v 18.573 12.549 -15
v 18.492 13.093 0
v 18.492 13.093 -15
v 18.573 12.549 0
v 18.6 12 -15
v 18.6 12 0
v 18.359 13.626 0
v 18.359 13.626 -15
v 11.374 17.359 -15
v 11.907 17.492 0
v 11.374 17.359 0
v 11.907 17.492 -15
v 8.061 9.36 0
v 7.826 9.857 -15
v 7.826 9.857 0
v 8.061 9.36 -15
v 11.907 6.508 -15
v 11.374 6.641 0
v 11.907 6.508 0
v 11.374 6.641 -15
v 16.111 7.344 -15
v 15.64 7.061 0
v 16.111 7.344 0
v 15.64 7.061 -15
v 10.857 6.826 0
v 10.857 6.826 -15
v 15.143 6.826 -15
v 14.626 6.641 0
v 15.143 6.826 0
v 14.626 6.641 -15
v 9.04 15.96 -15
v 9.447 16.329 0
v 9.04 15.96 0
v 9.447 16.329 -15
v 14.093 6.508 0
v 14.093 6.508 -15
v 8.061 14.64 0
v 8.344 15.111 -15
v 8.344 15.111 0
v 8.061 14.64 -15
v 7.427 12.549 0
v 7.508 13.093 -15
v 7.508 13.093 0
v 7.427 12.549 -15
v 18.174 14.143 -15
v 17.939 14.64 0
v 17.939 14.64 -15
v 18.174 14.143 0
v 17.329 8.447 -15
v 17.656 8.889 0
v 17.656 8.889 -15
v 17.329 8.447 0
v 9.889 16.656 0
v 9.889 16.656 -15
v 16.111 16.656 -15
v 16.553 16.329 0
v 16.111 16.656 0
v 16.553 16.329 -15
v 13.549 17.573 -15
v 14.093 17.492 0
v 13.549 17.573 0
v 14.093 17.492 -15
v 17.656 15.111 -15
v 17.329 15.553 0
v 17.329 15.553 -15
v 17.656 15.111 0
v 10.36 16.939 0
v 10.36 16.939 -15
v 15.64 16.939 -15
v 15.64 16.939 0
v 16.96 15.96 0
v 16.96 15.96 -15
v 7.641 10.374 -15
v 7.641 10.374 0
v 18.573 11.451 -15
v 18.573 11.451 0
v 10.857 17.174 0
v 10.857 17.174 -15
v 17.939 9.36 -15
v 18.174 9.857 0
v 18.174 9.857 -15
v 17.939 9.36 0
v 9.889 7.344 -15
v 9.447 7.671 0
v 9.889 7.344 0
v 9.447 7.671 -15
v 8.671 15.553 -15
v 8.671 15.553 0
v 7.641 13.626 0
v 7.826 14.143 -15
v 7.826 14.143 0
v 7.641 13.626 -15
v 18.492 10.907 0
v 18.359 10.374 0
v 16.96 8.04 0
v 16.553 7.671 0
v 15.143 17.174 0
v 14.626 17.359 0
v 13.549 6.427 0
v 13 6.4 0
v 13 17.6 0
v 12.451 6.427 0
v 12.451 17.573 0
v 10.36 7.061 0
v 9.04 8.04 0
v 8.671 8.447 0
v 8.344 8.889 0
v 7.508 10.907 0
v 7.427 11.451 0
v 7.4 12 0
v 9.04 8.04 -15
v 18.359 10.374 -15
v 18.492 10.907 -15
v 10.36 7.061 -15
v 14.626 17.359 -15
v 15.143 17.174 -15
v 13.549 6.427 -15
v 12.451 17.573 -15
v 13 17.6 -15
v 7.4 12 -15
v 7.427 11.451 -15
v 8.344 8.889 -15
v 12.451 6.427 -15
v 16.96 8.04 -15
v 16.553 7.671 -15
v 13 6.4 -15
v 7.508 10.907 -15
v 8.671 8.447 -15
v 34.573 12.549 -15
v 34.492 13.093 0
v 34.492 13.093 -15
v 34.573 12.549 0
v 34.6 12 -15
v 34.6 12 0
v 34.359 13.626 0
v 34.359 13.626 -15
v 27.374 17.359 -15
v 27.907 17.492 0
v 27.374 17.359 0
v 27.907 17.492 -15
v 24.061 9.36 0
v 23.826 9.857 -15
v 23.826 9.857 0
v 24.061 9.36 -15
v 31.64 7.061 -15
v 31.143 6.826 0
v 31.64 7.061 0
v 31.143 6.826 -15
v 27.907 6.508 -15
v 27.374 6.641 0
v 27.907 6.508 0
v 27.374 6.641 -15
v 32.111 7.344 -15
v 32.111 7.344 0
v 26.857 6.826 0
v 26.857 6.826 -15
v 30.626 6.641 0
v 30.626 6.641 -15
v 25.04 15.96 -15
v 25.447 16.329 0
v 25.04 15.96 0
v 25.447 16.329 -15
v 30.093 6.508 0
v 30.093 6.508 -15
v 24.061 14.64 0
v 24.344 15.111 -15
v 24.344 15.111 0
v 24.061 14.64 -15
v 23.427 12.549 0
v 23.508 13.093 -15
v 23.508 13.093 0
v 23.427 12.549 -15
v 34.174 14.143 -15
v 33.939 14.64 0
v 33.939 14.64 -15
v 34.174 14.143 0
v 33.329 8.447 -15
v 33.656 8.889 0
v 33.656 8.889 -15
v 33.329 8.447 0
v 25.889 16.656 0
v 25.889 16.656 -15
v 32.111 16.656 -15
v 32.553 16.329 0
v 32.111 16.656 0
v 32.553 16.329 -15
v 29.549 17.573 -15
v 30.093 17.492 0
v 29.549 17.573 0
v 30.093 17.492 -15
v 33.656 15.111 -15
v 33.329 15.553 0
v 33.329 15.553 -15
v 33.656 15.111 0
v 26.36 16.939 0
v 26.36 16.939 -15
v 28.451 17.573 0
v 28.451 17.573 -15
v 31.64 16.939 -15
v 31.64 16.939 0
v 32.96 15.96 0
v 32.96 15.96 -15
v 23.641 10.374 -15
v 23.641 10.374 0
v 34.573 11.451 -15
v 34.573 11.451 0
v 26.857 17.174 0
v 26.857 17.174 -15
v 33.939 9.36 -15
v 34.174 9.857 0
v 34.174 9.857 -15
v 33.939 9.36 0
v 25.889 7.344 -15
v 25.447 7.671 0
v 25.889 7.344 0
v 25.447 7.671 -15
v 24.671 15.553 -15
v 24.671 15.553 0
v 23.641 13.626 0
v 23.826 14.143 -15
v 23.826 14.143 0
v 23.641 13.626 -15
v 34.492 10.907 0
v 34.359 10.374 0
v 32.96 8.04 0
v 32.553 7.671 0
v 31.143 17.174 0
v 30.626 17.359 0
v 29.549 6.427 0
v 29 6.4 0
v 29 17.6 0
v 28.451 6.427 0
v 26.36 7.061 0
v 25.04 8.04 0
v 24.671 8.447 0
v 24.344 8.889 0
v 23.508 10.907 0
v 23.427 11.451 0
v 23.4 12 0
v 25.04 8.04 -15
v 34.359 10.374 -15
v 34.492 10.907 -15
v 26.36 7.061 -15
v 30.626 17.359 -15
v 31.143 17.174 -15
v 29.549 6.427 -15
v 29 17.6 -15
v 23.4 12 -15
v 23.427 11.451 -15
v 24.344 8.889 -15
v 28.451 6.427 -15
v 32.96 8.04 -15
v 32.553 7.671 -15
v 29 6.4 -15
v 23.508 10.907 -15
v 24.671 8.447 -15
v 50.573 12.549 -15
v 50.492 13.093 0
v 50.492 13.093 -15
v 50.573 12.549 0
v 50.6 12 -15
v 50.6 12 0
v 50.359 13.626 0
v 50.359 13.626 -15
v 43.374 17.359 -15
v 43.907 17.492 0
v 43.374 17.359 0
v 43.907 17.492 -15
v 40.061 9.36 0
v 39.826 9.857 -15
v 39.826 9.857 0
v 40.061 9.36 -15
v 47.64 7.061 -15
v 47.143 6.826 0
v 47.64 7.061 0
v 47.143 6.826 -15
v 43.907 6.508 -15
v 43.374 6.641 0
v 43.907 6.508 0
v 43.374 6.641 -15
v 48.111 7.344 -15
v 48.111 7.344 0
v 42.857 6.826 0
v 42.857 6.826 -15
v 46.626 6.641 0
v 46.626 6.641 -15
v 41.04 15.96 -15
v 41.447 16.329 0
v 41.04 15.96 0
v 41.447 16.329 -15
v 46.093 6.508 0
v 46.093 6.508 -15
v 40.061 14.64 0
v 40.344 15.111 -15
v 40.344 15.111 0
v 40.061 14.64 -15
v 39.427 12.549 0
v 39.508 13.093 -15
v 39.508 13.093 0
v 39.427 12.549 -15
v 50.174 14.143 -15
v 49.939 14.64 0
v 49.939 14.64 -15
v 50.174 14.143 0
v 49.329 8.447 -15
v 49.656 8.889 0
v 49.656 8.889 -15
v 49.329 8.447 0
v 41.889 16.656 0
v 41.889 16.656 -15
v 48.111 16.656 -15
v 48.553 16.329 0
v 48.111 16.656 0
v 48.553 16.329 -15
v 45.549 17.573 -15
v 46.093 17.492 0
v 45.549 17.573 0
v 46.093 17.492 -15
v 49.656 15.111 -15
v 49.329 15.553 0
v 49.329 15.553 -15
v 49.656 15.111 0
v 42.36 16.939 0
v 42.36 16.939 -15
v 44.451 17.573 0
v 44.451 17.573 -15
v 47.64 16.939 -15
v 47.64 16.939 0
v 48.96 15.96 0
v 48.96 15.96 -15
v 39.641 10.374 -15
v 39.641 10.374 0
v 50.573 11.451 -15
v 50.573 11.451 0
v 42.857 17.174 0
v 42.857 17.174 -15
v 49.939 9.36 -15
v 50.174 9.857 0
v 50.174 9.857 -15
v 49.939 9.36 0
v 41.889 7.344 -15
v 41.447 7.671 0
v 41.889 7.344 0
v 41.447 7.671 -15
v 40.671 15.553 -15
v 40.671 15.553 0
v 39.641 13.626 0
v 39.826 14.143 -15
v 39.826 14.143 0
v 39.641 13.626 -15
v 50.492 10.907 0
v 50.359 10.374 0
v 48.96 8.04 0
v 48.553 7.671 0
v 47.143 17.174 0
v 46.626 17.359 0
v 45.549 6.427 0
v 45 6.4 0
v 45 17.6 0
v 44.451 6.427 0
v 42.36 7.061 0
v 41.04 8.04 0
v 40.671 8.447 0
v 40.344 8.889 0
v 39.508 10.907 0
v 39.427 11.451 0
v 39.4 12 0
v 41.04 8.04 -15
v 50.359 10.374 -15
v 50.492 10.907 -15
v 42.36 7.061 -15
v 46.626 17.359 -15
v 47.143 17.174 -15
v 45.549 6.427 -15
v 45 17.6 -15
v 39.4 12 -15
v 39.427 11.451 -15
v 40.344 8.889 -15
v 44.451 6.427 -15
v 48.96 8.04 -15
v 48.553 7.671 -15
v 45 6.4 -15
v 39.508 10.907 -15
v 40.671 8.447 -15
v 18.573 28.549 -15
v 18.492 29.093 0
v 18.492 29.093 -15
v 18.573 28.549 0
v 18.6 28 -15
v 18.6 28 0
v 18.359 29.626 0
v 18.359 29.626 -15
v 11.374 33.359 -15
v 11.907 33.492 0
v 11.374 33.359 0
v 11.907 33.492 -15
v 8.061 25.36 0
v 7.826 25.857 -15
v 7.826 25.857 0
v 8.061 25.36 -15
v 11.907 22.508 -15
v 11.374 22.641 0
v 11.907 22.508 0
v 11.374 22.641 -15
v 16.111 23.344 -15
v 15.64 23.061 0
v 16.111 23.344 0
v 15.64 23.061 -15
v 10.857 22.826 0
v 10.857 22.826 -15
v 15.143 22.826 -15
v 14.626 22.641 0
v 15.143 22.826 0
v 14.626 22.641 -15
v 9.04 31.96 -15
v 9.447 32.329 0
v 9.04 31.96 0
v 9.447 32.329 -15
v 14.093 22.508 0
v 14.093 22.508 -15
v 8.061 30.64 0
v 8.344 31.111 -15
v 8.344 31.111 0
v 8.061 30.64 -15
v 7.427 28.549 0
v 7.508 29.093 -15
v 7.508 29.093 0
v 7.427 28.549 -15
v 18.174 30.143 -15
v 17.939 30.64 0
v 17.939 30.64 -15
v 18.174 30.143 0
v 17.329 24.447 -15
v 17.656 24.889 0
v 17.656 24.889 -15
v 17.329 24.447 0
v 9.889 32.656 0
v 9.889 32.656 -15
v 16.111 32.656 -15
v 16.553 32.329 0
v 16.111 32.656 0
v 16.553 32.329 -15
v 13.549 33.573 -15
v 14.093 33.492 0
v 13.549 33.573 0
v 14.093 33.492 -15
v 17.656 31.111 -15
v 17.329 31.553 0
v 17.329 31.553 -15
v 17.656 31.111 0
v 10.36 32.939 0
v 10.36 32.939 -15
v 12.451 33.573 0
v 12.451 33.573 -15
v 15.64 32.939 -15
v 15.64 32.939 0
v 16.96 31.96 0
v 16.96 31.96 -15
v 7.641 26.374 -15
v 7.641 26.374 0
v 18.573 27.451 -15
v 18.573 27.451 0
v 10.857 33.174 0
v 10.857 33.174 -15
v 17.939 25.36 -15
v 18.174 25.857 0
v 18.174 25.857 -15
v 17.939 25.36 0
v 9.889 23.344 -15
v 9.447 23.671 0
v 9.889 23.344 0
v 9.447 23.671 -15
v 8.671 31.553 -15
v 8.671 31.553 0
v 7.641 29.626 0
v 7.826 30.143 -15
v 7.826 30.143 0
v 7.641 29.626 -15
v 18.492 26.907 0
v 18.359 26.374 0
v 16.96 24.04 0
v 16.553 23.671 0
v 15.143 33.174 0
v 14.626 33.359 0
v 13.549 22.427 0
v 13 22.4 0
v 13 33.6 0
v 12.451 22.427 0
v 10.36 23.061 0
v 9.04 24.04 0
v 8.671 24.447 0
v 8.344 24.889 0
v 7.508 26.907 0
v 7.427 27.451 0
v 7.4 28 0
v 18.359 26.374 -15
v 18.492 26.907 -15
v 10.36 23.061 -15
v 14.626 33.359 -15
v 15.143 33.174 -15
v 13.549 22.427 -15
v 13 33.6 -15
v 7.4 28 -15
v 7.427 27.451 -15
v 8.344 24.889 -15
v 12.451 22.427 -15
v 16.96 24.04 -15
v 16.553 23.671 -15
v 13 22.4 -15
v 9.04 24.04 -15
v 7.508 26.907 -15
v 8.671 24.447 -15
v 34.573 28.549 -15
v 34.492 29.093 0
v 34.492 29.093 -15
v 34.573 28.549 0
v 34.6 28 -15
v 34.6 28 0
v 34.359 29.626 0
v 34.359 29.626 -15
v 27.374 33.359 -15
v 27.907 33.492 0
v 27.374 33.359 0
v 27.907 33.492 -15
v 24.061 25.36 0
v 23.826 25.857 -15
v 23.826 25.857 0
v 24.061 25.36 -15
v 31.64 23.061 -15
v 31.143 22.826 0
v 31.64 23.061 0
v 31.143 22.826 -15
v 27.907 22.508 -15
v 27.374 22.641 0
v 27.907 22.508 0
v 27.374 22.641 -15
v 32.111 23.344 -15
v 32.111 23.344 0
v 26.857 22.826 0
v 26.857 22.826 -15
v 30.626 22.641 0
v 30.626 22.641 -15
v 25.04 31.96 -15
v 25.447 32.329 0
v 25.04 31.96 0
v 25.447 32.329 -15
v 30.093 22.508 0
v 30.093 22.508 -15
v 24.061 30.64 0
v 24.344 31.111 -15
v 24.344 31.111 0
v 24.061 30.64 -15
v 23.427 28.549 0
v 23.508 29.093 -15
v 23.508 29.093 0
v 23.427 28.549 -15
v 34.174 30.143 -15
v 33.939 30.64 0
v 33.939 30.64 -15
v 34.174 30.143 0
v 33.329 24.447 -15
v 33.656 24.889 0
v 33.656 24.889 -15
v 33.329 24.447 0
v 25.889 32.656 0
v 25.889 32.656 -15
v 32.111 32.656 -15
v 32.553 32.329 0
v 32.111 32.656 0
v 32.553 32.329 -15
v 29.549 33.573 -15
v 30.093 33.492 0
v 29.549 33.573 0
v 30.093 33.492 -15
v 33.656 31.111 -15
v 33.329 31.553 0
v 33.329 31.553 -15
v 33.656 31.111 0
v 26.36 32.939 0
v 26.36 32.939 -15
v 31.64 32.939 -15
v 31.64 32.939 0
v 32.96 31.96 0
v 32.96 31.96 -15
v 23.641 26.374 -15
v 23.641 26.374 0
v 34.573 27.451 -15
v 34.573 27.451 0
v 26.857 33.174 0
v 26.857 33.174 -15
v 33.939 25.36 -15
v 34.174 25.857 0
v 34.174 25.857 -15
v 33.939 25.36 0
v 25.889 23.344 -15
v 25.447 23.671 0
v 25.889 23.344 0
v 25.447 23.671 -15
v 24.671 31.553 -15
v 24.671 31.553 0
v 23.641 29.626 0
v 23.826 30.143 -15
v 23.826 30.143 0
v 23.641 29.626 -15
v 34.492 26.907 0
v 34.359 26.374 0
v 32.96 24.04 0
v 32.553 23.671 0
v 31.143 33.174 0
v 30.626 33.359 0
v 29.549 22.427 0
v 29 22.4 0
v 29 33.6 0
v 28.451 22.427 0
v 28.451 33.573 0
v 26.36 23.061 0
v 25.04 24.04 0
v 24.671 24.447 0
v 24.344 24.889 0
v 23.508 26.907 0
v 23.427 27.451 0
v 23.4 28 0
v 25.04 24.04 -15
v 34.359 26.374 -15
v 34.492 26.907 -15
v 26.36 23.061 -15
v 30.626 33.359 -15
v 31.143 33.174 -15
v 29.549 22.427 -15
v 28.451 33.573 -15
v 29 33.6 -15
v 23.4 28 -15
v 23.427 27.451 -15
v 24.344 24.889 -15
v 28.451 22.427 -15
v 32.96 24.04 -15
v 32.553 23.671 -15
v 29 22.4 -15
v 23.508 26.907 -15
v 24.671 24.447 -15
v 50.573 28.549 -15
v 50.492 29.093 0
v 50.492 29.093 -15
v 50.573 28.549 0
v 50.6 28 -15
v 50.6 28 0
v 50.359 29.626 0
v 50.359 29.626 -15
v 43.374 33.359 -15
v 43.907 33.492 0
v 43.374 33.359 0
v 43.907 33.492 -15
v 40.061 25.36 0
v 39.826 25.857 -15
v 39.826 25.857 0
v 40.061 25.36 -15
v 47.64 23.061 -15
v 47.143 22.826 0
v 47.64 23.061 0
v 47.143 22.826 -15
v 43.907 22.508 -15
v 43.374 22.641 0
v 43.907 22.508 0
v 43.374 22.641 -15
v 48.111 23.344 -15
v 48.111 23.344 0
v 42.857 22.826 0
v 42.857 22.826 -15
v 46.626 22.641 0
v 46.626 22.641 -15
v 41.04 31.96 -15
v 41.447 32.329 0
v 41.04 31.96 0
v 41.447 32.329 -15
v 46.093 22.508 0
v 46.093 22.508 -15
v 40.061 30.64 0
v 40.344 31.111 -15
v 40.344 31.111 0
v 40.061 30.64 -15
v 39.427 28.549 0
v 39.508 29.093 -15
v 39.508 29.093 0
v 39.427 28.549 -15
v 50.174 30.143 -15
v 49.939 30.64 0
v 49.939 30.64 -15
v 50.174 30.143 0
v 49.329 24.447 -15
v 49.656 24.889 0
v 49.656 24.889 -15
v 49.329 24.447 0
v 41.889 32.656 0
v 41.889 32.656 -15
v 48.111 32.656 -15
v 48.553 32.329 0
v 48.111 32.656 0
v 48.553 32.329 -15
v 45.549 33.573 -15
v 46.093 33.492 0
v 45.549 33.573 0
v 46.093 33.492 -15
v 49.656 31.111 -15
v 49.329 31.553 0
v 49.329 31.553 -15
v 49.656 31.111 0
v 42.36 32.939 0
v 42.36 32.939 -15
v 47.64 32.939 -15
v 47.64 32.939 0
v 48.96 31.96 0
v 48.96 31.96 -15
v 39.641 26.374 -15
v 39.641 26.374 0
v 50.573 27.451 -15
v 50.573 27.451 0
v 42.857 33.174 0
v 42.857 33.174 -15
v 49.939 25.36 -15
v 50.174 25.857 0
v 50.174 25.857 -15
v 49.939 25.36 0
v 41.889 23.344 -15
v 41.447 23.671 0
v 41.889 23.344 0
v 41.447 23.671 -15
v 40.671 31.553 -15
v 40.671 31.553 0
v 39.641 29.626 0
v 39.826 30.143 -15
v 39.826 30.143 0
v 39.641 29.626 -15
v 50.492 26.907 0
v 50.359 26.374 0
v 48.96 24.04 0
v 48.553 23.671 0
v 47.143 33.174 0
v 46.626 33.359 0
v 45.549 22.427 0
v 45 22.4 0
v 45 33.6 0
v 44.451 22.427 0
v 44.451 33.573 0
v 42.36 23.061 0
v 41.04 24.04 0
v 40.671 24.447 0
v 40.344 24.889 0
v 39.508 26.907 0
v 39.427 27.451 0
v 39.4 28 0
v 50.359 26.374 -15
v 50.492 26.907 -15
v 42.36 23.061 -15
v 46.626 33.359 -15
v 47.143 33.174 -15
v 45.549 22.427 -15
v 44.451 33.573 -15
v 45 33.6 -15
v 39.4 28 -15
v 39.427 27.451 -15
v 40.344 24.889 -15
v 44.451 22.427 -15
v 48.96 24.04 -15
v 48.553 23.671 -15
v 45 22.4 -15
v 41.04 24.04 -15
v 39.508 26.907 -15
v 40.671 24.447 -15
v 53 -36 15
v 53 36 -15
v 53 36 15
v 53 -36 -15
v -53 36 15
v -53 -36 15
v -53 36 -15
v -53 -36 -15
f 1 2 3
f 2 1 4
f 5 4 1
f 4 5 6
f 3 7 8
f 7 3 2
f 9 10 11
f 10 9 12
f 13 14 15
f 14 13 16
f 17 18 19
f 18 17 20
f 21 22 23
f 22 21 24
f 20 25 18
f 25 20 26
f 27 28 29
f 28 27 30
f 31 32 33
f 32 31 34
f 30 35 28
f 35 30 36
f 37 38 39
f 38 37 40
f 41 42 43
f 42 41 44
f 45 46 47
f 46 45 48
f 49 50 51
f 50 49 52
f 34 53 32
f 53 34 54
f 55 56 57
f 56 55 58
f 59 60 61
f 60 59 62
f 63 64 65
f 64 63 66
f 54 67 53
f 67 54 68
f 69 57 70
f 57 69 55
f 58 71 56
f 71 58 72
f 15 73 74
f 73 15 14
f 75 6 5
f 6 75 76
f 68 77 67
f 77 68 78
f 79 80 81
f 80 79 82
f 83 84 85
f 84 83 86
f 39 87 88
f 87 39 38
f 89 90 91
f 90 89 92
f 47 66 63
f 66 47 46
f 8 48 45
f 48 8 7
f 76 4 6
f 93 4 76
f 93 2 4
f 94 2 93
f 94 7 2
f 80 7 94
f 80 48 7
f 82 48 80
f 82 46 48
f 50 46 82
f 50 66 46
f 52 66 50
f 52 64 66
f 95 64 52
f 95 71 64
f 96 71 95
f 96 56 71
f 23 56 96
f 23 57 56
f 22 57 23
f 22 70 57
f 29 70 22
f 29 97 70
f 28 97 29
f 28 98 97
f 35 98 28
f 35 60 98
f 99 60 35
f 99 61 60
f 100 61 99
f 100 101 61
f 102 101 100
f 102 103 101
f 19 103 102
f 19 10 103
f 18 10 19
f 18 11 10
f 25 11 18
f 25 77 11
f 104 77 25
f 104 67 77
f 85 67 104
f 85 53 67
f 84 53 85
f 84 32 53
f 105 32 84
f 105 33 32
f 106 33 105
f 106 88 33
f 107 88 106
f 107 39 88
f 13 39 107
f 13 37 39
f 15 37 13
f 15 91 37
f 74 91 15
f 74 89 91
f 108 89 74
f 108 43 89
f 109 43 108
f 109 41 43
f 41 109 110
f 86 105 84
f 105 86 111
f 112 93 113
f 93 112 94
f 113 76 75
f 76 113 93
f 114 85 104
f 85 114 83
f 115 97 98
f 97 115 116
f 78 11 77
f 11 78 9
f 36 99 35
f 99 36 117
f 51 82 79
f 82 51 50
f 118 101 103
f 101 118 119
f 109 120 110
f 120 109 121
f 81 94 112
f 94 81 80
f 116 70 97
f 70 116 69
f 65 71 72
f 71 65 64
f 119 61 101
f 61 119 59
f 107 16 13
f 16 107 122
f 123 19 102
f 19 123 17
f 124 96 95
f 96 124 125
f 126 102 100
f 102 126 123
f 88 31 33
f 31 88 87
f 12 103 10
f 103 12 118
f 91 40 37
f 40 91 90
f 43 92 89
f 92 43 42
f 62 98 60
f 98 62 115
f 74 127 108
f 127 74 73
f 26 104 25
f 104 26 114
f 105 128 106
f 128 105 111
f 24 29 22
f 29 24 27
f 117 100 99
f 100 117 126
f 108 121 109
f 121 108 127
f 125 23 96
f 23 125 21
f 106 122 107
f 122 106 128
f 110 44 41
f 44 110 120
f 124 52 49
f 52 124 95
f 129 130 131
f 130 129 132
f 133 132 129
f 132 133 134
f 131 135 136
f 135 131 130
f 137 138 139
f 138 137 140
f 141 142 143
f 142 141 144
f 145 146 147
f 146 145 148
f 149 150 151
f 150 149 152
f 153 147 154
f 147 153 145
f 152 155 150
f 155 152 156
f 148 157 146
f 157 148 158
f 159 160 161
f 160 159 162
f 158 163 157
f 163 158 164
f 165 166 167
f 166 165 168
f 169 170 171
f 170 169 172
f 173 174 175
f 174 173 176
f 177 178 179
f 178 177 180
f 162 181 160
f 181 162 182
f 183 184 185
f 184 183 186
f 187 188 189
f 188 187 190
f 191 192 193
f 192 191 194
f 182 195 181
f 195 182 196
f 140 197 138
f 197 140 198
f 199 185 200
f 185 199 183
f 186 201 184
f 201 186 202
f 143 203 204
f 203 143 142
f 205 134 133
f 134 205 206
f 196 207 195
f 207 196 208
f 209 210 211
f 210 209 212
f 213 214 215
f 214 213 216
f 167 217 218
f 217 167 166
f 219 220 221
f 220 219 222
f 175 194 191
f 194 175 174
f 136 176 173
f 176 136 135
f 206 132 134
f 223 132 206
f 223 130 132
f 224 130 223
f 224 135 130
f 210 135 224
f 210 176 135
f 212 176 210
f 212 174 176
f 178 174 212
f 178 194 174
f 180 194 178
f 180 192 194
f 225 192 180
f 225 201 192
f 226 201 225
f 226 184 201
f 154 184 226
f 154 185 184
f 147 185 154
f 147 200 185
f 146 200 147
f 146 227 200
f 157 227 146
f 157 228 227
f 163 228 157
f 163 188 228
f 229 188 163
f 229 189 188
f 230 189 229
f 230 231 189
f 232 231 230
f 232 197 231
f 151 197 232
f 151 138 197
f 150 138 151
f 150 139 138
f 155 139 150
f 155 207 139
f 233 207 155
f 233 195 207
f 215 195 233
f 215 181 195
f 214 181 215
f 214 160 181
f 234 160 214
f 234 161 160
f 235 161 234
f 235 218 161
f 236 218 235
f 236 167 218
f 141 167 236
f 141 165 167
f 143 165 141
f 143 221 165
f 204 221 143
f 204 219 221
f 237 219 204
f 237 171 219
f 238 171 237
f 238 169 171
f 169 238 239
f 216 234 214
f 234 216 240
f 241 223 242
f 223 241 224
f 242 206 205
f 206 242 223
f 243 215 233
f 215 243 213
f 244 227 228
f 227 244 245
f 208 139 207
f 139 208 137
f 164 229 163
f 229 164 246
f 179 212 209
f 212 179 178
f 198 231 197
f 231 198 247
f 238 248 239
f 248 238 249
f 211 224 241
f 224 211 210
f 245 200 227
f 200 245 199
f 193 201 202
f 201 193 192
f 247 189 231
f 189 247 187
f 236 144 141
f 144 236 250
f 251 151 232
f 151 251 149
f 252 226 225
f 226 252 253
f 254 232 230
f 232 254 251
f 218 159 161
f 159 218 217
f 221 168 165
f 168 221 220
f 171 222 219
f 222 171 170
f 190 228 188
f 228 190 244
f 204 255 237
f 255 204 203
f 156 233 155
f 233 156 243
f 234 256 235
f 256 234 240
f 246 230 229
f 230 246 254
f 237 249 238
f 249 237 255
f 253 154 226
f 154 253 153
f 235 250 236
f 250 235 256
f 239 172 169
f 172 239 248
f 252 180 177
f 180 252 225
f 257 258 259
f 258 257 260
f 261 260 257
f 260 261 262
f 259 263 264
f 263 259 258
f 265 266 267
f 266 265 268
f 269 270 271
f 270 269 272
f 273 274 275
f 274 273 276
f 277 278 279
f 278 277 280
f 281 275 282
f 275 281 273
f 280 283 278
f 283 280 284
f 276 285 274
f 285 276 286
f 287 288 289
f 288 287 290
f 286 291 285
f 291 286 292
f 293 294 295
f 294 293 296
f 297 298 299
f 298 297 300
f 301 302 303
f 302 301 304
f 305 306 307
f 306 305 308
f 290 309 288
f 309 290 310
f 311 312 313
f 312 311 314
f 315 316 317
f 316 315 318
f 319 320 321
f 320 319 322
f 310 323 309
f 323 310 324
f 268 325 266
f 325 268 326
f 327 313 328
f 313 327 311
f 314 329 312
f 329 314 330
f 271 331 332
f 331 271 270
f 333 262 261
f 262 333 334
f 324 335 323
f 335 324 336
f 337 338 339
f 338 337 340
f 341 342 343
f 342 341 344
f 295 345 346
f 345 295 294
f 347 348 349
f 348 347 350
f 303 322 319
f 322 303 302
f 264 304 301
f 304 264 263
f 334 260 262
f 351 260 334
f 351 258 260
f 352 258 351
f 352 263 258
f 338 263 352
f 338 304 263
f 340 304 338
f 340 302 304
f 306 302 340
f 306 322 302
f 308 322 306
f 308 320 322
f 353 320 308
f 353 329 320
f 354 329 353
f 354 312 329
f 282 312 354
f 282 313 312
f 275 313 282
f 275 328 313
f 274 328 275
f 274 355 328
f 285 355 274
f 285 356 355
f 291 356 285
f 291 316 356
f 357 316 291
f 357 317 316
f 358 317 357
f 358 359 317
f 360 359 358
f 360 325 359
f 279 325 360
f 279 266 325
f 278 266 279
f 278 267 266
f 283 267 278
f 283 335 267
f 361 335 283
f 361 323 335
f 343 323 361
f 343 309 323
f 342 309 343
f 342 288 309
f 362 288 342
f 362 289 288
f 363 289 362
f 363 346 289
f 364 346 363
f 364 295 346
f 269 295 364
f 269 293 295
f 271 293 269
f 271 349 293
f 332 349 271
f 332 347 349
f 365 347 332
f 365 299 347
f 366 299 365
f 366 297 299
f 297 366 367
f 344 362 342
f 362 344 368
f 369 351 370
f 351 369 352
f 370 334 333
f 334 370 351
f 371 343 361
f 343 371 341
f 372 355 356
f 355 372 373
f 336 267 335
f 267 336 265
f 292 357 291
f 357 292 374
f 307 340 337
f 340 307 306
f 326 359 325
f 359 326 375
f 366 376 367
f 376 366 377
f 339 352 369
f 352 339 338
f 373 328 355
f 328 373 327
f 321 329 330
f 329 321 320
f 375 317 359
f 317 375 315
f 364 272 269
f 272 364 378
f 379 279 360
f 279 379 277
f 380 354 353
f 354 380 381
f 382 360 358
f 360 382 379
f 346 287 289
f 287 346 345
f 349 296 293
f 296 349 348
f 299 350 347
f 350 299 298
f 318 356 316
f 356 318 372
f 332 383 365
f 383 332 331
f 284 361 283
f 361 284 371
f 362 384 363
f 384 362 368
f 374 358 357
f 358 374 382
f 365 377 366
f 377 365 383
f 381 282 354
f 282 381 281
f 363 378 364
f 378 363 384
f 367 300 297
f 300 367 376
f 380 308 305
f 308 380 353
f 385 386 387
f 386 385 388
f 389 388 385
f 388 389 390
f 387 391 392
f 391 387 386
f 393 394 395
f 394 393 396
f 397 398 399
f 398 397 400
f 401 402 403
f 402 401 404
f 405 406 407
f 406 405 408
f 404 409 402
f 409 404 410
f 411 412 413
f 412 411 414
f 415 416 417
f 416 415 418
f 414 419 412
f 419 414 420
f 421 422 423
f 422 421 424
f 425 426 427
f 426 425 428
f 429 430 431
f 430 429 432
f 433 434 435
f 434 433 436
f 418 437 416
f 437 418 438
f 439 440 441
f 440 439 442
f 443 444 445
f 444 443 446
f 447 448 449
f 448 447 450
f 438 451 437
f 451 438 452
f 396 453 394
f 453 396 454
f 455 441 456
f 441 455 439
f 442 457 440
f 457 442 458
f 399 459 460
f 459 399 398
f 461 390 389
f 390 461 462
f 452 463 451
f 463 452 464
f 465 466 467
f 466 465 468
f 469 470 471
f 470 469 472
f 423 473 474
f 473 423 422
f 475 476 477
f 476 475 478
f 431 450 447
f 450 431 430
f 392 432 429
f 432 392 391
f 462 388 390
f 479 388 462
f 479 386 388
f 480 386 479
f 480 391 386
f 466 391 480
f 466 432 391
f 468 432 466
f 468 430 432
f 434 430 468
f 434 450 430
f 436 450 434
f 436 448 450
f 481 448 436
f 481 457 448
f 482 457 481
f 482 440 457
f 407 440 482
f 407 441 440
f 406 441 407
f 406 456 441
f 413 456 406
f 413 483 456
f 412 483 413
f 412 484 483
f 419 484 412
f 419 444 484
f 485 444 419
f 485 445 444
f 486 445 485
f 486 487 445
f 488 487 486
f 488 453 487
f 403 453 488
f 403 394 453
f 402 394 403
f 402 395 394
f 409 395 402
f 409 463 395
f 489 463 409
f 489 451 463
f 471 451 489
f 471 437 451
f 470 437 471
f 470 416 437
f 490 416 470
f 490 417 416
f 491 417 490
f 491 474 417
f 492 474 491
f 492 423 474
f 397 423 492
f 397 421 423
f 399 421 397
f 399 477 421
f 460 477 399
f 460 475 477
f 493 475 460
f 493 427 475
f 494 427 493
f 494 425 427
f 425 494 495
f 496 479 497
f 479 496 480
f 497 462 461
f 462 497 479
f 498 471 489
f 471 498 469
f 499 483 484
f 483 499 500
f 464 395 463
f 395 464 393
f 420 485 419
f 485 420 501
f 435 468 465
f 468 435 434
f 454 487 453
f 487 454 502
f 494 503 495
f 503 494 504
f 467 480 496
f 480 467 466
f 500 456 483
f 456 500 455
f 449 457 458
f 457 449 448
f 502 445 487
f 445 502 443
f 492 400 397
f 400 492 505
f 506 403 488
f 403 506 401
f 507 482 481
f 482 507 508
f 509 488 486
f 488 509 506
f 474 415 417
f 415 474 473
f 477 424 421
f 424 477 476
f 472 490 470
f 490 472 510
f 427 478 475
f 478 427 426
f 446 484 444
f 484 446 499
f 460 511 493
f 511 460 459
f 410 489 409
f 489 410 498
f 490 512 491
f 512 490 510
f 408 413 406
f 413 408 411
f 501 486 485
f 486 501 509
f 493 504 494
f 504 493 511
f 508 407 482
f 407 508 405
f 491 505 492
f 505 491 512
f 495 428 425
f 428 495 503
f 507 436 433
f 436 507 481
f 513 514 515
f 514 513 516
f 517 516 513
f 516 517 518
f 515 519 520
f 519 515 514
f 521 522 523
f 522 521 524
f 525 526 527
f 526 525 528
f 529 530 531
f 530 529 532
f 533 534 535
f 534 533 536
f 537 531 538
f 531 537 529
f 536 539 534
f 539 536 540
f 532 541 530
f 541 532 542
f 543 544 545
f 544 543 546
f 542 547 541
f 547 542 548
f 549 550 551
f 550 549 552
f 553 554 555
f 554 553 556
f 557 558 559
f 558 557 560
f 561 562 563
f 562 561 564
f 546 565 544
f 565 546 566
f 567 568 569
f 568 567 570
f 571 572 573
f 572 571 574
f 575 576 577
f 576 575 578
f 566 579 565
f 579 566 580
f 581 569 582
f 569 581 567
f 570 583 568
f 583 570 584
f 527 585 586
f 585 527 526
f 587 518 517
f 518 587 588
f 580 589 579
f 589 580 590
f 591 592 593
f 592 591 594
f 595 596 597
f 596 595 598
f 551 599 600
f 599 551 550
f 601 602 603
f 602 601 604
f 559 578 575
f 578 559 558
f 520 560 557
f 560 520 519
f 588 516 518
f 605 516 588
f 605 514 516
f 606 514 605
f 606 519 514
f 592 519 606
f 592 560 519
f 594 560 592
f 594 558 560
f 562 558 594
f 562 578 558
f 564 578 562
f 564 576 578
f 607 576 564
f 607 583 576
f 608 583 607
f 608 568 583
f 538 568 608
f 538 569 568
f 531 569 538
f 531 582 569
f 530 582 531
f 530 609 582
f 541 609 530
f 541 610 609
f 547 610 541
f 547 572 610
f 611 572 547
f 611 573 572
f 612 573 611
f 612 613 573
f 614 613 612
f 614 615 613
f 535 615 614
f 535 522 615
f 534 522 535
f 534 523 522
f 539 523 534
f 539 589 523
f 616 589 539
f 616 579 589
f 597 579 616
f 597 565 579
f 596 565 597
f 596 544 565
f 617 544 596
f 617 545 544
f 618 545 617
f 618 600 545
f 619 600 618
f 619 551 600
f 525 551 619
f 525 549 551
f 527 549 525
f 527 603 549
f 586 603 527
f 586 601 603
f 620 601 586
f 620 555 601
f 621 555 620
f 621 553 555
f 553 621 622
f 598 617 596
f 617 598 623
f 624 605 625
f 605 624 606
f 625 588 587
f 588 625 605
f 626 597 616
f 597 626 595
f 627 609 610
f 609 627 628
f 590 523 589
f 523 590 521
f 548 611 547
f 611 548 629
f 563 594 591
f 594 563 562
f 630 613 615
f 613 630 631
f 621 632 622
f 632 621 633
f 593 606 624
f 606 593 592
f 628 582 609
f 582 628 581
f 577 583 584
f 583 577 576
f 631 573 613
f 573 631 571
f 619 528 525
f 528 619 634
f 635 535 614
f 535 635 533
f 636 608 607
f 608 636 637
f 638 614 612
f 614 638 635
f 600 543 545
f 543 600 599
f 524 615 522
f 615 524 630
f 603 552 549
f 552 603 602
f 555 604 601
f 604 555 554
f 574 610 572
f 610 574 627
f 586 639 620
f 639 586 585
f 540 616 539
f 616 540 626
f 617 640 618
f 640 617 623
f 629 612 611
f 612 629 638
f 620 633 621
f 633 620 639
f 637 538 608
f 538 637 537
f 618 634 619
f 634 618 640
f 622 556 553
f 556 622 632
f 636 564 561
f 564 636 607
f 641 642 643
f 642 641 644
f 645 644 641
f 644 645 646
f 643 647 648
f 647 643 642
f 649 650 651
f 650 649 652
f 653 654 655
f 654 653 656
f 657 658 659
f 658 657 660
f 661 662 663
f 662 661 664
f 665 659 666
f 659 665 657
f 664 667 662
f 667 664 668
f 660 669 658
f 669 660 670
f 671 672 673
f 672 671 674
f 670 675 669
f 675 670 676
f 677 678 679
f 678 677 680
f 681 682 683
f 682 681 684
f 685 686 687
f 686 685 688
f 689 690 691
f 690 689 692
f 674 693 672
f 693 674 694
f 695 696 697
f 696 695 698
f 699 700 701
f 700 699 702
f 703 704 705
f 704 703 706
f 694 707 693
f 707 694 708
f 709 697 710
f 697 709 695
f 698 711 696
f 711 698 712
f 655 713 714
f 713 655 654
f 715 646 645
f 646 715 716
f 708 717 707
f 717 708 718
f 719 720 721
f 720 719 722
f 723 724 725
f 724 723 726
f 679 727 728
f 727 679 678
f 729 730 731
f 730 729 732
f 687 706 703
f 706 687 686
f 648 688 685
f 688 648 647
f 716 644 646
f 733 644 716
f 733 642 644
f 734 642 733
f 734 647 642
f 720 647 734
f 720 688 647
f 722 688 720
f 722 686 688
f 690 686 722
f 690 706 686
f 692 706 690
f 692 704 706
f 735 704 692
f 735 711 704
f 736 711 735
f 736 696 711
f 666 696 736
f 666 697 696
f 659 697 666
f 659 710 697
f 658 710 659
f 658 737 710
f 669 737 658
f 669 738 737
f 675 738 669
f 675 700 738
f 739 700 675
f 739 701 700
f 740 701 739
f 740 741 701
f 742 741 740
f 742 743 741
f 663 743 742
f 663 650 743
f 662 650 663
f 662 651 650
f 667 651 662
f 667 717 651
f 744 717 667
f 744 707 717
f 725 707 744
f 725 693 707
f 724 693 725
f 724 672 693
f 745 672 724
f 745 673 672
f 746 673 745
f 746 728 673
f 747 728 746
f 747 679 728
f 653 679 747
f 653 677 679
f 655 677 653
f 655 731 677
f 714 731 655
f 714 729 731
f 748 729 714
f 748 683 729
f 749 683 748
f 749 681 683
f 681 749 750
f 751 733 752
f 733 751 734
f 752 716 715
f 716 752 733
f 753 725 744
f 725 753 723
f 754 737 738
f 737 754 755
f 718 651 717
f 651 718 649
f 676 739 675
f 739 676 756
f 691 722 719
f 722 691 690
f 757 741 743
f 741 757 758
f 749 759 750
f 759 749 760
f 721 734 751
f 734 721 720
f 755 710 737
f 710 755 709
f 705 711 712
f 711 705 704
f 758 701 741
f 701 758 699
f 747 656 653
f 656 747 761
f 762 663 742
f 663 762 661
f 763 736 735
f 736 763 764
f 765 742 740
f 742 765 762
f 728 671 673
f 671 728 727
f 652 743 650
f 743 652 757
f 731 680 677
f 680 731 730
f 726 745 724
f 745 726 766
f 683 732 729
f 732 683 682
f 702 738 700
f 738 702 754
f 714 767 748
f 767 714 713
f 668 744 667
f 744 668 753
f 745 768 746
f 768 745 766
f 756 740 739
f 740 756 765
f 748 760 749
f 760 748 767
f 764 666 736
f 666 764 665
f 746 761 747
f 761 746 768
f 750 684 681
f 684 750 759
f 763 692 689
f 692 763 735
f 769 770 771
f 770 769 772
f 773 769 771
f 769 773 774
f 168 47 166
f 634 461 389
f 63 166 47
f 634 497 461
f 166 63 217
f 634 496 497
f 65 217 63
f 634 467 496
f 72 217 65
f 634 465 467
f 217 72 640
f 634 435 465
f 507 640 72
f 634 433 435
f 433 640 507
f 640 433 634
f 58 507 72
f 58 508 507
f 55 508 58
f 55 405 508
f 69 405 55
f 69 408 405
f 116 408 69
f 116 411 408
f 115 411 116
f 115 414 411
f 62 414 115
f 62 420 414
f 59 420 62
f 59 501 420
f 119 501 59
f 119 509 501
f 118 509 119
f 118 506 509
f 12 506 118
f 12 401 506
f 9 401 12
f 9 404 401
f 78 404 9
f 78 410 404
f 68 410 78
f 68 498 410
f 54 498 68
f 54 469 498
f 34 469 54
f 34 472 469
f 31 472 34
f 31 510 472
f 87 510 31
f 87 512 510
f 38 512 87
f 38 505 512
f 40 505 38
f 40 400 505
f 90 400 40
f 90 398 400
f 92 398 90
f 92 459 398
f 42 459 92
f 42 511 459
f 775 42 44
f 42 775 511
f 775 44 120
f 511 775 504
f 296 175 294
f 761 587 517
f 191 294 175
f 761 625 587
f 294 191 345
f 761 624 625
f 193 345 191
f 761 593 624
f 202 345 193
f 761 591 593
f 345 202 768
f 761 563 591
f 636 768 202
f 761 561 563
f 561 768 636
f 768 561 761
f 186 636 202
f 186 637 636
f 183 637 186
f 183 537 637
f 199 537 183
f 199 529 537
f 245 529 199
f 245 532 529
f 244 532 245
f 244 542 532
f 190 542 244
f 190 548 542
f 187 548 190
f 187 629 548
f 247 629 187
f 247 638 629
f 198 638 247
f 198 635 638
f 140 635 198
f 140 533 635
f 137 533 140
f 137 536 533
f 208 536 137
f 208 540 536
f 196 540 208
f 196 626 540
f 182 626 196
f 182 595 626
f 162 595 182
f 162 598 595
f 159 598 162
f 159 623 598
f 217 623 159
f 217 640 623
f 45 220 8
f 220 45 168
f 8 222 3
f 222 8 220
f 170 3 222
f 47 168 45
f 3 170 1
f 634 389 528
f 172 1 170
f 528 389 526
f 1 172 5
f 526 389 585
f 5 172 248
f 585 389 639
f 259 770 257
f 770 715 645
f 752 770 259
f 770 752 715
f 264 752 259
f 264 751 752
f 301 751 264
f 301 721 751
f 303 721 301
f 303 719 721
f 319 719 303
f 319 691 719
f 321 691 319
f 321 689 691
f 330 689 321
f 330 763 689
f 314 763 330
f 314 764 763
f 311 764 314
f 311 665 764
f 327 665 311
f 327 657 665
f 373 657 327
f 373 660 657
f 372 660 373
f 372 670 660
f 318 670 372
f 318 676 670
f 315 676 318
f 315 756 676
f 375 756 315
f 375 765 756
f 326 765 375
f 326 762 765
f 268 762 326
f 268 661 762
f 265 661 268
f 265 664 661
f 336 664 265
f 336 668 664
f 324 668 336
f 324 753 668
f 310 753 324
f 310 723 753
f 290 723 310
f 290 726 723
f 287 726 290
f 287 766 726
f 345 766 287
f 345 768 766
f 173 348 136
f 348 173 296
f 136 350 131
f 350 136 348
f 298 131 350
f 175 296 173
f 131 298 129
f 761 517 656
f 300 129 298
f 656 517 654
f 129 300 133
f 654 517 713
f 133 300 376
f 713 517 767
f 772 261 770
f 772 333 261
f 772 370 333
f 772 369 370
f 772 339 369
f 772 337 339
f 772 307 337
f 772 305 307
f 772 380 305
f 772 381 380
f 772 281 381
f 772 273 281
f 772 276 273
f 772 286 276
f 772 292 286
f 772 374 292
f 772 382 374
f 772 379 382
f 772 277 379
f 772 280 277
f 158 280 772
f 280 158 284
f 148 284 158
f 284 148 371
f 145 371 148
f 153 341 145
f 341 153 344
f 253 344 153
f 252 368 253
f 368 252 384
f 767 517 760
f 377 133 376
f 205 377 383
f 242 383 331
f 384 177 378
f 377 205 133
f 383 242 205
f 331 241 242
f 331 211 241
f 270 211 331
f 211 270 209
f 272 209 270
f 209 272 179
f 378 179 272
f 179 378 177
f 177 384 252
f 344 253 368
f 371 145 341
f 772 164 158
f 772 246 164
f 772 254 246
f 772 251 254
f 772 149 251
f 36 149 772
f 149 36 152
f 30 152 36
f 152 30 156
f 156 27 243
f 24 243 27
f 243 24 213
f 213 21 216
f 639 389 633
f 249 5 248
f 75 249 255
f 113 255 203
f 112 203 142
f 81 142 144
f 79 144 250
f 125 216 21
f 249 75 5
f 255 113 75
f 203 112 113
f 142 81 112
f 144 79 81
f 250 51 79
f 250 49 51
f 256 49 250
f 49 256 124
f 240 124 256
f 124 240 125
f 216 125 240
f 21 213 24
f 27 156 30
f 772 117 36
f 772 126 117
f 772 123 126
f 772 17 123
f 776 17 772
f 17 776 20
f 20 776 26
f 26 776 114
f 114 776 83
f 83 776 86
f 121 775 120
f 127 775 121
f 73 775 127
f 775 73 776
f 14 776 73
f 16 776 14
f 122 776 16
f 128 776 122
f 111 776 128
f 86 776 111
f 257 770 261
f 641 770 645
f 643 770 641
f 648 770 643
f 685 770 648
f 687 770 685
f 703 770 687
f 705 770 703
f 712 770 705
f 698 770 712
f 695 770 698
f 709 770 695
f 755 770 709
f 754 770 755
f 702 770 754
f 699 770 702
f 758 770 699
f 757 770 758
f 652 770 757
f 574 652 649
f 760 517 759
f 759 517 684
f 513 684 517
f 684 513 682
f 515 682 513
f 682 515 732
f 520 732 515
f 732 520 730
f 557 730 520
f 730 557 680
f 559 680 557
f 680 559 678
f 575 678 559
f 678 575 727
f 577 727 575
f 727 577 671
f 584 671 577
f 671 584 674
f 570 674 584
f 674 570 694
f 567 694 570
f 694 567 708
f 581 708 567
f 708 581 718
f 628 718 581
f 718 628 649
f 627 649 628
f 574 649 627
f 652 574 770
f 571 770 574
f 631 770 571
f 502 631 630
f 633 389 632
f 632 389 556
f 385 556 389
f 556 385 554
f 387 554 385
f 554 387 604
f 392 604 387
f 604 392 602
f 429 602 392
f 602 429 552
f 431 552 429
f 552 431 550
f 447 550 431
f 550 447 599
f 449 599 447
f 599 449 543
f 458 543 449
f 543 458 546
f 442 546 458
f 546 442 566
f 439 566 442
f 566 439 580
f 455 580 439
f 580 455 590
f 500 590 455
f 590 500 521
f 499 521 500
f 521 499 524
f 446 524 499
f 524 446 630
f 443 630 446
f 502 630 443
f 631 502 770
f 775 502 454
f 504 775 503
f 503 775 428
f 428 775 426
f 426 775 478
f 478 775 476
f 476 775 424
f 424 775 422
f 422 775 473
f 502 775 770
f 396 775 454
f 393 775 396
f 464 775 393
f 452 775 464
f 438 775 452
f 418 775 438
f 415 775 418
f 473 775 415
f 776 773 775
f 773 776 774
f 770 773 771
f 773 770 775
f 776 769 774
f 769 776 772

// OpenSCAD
// Bench Rack for 1.5 mL Microcentrifuge Tubes
// Designed for FDM printing. Rests on XY plane at Z=0.

// --- Dimensions ---
// Block dimensions
$block_length = 106; // X
$block_width = 72;   // Y
$block_height = 30;  // Z

// Grid configuration
$grid_rows = 4;      // Rows along Y
$grid_cols = 6;      // Columns along X
$grid_spacing_x = 16; // Centre-to-centre X
$grid_spacing_y = 16; // Centre-to-centre Y

// Hole configuration
$hole_diameter = 11.2;
$hole_depth = 25;    // Depth of the hole (open top, closed bottom)
$floor_thickness = 5; // Solid floor at bottom (30 - 25 = 5)

// --- Settings ---
$fn = 64; // Smooth curves for holes

// --- Calculations ---
// Calculate offsets to center the grid on the block
// Total grid width = (cols - 1) * spacing
// Offset from edge = (Block Width - Total Grid Width) / 2
$offset_x = ($block_length - ($grid_cols - 1) * $grid_spacing_x) / 2;
$offset_y = ($block_width - ($grid_rows - 1) * $grid_spacing_y) / 2;

// --- Main Block ---
difference() {
    // 1. Create the solid rectangular block
    cube([
        $block_length,
        $block_width,
        $block_height
    ], center = true);

    // 2. Cut the holes
    // We use a loop to generate the cutting cylinders.
    // The cylinders are positioned relative to the block center.
    for (r = [0 : $grid_rows - 1], c = [0 : $grid_cols - 1]) {
        // Calculate position of current hole center
        $x_pos = $offset_x + c * $grid_spacing_x;
        $y_pos = $offset_y + r * $grid_spacing_y;
        
        // Create the hole cylinder
        // Radius is half diameter
        $r_hole = $hole_diameter / 2;
        
        // Translate to hole position
        translate([
            $x_pos,
            $y_pos,
            -$hole_depth - 0.1 // Extend slightly past bottom to ensure clean cut
        ]) {
            cylinder(
                h = $hole_depth + 0.1,
                r1 = $r_hole,
                r2 = $r_hole,
                $fn = $fn
            );
        }
    }
}
